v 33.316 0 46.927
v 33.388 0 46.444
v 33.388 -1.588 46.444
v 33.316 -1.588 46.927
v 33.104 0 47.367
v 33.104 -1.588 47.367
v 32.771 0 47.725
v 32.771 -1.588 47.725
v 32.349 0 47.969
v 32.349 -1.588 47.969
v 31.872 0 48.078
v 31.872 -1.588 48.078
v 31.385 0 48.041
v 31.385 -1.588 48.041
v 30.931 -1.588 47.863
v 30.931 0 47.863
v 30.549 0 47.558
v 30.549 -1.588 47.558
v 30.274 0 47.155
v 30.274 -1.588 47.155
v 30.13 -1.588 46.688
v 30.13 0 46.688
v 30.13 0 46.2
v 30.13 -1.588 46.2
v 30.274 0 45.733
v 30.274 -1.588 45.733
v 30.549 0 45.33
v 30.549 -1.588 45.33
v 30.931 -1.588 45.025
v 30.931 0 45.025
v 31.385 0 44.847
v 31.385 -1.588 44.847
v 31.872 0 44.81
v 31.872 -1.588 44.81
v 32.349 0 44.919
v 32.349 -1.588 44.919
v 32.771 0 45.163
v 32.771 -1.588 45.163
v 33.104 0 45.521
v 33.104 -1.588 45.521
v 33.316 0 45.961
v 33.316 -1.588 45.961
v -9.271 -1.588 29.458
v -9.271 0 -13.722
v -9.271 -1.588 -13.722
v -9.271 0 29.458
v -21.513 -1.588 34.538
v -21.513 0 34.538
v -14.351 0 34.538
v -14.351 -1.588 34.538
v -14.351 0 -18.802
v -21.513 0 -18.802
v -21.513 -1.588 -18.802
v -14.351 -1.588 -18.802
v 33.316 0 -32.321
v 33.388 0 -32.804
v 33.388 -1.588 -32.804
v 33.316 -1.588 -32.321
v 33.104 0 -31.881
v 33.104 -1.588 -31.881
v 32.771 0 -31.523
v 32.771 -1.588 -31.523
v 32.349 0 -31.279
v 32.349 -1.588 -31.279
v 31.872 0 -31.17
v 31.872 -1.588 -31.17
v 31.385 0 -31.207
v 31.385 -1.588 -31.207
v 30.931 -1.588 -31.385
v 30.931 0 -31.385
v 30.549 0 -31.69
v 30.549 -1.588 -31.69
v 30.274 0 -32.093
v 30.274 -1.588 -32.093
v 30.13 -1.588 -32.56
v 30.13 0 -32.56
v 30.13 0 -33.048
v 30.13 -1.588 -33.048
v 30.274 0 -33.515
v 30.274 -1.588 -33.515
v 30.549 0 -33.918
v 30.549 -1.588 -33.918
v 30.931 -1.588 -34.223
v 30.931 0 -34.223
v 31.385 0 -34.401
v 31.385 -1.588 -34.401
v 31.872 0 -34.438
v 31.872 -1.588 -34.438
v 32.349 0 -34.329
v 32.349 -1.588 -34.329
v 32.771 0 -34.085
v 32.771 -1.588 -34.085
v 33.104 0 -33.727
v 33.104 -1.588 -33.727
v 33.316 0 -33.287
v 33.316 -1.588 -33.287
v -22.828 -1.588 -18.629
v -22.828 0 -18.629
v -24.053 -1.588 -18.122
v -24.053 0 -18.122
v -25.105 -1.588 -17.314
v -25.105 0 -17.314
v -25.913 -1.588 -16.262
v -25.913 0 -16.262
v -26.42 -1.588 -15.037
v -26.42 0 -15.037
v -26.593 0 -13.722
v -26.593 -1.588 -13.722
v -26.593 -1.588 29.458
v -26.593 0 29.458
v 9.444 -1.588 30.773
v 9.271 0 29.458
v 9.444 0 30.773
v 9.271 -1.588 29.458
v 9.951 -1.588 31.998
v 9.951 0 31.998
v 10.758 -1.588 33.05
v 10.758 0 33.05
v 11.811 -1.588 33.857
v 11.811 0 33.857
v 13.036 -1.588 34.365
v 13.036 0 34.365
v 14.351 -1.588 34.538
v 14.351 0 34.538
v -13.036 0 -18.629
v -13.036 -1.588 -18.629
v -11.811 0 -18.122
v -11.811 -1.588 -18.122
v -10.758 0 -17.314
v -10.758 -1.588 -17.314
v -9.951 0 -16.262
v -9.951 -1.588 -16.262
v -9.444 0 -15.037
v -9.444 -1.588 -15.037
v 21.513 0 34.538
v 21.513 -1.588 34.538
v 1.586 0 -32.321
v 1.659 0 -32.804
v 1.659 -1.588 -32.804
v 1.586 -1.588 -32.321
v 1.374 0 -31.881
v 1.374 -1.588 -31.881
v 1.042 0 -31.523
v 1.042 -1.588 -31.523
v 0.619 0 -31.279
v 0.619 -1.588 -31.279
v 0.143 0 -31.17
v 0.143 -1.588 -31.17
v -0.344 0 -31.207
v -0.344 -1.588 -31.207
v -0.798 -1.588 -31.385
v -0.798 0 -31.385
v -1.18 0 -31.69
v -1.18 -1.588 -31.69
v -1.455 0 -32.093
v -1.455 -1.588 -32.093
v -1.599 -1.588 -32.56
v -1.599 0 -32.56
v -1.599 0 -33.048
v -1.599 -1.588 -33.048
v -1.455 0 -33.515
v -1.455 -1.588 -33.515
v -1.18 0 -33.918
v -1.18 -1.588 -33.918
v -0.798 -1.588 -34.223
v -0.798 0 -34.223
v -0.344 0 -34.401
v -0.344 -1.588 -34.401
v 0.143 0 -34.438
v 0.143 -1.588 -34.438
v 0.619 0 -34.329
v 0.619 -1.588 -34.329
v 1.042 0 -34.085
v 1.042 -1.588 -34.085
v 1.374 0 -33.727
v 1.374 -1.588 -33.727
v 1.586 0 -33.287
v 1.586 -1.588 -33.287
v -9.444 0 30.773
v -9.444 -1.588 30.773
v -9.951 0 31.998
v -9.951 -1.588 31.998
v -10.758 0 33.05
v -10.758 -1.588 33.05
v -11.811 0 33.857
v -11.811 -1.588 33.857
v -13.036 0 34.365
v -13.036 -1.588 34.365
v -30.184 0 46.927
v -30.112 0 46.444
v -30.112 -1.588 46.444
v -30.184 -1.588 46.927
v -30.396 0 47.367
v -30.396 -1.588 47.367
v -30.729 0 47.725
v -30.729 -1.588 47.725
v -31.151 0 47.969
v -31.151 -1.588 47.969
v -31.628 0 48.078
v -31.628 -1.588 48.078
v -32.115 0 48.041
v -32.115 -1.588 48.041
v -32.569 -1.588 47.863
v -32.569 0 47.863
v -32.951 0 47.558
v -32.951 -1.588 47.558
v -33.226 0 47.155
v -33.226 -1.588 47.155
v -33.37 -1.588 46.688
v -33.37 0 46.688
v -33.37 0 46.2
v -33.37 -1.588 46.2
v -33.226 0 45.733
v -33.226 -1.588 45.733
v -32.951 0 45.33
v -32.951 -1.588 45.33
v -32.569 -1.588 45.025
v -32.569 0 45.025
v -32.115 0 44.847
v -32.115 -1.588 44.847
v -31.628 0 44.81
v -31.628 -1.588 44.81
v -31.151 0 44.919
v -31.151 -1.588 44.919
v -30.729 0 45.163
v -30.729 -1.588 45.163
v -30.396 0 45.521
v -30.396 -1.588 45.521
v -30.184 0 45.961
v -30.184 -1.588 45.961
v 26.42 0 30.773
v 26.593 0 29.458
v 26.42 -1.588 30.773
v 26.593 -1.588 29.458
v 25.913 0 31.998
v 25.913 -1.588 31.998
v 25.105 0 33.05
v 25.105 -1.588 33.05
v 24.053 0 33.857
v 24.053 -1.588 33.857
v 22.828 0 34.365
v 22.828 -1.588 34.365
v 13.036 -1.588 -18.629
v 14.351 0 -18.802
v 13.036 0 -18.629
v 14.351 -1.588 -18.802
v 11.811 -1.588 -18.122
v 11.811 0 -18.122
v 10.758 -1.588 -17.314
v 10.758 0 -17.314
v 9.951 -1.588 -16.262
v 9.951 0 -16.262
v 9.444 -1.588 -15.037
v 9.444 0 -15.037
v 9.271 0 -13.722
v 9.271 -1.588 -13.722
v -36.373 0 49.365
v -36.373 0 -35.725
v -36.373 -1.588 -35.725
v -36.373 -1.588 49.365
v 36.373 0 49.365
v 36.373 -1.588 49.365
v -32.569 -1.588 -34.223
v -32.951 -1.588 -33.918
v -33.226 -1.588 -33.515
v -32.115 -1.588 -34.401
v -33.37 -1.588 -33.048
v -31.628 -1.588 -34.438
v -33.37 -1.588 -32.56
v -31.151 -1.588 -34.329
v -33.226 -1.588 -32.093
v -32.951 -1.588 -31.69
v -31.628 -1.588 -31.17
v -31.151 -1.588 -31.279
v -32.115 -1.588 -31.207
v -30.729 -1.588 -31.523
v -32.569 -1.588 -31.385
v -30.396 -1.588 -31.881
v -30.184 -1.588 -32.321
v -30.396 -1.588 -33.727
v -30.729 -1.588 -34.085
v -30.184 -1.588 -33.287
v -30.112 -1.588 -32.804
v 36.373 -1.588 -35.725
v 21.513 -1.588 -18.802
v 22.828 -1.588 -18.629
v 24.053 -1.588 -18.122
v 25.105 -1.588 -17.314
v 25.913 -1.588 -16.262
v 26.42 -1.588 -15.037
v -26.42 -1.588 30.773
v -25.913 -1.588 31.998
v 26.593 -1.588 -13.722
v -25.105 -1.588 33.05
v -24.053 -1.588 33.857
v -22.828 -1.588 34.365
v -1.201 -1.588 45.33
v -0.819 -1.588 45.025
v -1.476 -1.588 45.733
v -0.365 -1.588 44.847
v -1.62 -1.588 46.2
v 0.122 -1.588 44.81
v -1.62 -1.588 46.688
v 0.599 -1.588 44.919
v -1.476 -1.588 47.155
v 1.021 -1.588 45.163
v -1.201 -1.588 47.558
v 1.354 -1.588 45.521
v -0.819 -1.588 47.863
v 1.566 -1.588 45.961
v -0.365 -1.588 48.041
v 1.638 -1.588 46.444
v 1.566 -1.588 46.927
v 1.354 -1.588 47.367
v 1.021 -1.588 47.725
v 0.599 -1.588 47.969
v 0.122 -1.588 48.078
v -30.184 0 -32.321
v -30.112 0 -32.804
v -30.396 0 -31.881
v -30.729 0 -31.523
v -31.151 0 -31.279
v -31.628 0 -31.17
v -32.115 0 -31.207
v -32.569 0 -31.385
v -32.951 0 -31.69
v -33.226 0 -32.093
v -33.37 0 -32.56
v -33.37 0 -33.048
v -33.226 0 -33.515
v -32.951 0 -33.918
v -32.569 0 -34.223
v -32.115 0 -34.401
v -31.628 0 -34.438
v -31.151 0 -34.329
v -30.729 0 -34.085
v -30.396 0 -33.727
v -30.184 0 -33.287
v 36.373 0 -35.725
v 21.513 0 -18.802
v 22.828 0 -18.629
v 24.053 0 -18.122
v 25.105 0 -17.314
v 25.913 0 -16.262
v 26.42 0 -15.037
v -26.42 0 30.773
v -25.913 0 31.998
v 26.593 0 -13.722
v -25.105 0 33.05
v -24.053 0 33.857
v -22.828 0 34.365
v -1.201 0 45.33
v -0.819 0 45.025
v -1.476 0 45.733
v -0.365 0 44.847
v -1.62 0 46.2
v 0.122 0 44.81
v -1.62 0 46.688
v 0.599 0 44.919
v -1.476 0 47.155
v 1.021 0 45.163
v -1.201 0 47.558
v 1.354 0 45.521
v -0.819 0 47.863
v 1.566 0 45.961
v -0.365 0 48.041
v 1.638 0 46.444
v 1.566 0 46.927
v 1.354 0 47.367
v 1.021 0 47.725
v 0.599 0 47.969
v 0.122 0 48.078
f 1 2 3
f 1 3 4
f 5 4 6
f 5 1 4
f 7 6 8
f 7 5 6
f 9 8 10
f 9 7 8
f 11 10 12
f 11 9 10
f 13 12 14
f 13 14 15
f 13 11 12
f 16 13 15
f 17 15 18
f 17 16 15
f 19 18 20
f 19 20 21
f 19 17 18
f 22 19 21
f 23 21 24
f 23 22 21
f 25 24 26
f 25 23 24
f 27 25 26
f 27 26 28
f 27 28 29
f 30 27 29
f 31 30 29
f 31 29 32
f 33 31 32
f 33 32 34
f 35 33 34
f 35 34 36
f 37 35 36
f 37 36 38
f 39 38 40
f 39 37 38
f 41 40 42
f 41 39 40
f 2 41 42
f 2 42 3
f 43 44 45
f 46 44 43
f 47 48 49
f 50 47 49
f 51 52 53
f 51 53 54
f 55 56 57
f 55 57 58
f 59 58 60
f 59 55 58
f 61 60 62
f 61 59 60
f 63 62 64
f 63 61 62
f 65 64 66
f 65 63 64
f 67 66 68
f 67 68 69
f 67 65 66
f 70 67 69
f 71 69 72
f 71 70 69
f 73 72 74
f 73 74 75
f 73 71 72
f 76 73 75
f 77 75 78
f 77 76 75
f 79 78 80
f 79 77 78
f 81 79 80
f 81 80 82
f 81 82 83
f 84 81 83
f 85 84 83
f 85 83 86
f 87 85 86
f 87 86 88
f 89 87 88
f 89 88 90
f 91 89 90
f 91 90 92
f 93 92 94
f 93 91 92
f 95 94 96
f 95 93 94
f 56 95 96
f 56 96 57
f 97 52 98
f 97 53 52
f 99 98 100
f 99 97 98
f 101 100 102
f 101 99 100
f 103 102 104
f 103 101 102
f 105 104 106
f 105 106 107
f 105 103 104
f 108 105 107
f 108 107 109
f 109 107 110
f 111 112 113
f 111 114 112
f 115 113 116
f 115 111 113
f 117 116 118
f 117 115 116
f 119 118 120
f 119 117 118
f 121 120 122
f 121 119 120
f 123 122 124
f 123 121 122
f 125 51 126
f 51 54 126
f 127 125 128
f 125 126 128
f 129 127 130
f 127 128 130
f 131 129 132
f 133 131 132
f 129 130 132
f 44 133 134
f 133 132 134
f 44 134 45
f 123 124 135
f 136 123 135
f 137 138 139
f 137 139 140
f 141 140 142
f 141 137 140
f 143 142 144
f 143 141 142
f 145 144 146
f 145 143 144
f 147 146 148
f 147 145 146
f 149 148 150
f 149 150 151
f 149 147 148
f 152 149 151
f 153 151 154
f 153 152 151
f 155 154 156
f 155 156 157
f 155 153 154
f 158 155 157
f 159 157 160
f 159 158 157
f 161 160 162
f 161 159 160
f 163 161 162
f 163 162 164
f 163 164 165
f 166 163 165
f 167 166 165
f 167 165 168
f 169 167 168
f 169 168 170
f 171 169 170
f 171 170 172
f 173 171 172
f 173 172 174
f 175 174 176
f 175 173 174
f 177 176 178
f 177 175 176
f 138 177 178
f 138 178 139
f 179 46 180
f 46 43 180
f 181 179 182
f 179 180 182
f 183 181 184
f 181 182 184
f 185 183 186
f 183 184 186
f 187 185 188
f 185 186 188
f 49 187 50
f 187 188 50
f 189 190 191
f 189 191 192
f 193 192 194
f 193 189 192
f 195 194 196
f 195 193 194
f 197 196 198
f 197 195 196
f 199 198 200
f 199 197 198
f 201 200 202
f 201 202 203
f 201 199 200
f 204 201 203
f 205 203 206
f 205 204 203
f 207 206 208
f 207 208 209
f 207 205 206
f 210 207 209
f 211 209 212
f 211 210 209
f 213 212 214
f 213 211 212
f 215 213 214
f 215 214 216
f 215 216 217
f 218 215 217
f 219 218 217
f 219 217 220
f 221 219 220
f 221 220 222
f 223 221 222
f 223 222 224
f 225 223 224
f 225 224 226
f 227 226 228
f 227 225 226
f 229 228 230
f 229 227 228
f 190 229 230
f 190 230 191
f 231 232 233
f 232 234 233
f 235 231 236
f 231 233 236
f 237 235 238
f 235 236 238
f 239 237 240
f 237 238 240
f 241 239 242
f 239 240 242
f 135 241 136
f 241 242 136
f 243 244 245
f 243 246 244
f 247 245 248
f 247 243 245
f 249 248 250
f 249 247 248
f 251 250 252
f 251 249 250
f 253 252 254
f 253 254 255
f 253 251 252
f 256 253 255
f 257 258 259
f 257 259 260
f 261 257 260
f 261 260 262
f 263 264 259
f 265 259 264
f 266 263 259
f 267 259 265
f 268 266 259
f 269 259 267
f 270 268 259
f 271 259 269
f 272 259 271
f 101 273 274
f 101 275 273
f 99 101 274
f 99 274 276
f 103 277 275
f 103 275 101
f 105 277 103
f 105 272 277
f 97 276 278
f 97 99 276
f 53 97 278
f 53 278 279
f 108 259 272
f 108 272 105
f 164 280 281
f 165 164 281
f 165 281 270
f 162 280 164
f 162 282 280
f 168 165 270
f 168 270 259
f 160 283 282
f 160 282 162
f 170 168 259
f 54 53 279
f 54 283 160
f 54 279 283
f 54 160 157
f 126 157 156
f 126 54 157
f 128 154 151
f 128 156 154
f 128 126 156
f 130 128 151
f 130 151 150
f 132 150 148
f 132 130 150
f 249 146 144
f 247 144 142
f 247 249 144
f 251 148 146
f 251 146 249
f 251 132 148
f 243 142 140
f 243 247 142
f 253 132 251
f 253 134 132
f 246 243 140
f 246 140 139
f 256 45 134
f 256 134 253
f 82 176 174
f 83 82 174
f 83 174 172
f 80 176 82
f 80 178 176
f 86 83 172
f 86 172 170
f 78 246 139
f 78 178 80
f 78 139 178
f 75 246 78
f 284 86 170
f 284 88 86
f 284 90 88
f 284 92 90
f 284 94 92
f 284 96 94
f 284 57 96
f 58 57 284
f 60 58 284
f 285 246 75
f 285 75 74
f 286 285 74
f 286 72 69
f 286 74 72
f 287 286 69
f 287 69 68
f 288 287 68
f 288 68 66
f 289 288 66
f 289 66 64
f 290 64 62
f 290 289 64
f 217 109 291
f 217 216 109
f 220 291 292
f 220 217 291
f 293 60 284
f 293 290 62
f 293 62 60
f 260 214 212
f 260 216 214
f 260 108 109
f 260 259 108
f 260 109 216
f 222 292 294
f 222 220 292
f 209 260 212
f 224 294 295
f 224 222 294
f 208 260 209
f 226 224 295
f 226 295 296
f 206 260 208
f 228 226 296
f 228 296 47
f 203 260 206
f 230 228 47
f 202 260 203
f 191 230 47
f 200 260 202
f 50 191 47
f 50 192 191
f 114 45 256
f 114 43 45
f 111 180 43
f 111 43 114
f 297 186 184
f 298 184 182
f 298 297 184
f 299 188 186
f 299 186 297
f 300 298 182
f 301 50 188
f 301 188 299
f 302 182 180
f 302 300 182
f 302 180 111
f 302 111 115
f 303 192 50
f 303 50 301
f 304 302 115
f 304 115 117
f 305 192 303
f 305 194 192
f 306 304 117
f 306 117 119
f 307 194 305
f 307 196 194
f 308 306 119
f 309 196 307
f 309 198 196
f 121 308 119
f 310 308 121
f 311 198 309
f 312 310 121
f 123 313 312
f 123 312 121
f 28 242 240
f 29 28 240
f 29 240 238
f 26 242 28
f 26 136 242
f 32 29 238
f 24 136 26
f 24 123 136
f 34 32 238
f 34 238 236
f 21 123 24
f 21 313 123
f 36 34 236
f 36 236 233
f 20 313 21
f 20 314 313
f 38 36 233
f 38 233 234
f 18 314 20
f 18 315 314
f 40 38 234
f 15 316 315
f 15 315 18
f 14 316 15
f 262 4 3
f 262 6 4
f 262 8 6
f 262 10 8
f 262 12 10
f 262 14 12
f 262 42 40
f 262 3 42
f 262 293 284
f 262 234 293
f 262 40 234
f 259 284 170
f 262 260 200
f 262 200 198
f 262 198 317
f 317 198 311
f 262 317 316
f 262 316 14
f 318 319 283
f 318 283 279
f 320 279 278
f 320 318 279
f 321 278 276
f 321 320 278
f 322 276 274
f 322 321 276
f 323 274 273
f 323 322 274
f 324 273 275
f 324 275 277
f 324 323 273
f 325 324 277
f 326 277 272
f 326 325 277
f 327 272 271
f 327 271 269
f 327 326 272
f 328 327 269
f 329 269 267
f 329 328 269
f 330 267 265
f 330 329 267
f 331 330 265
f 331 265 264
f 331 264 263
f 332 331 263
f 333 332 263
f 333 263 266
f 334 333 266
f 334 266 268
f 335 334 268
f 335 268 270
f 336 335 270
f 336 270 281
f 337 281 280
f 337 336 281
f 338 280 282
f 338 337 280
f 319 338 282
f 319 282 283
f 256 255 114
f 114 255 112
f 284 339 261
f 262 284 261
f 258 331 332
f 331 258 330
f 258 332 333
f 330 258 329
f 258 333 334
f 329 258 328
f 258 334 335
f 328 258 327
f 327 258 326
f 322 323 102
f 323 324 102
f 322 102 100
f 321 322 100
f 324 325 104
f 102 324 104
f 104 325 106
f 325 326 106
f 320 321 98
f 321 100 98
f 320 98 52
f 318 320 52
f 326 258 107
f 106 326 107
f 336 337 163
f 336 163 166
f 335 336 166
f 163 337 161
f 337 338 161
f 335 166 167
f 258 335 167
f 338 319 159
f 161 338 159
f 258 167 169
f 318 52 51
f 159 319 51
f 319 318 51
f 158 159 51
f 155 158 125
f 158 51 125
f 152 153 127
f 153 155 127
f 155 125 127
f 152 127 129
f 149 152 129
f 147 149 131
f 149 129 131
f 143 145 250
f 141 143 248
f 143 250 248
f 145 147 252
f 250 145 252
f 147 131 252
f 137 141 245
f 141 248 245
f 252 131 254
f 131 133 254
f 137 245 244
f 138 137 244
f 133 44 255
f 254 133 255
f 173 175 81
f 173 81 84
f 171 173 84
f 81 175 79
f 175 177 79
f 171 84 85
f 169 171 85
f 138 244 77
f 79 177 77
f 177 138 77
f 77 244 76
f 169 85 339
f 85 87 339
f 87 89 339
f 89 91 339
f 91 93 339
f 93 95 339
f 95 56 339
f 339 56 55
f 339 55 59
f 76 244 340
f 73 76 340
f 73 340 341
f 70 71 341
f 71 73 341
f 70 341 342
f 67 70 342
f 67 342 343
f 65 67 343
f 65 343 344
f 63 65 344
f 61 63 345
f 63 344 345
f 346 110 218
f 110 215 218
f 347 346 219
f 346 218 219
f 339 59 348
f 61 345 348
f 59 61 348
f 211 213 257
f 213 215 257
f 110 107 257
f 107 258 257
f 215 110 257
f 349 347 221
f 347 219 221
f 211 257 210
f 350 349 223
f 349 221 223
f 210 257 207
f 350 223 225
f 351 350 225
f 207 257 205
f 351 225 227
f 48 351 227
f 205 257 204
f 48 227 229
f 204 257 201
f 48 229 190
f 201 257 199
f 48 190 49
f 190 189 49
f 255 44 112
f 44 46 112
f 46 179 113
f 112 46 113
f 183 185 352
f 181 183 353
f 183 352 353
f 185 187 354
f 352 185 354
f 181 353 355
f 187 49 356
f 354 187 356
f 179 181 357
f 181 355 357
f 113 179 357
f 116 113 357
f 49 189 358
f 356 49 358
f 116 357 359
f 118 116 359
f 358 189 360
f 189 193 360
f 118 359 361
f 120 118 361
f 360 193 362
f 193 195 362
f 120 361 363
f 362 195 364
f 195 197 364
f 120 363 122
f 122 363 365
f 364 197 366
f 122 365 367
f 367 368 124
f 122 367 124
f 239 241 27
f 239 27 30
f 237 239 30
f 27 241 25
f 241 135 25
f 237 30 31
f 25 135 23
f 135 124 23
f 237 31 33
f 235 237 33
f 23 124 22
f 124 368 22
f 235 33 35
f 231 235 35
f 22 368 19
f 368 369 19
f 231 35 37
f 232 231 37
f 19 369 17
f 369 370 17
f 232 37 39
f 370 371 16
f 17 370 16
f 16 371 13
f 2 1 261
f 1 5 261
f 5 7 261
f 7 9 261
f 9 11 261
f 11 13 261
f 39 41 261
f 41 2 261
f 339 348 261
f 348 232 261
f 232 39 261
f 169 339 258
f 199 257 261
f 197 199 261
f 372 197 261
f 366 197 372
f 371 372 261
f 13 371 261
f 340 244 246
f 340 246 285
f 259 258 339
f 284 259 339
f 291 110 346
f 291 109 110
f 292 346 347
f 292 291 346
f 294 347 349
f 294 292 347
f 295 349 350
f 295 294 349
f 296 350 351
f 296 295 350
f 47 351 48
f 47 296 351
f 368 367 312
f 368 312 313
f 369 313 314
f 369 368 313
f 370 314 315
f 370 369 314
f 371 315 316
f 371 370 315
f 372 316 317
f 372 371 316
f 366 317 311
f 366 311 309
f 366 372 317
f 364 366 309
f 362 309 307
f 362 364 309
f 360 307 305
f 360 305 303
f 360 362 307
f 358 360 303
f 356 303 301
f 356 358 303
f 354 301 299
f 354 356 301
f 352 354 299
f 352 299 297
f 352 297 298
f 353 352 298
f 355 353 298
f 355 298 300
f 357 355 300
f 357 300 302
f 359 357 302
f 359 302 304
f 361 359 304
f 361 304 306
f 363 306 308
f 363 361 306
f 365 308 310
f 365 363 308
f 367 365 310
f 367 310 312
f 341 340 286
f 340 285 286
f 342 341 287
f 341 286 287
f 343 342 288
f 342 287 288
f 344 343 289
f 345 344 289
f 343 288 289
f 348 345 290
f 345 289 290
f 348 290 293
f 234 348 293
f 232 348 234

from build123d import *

# Parameters (mm, degrees)
F0_W     = 72.7456
F0_H     = 85.09
F0_R     = 1.6383
F0_W_2   = 17.3228
F0_H_2   = 53.34
F1_DEPTH = 1.5875
F2_R     = 5.08


with BuildPart() as f1:
    # F0 (on Front) → F1 (new body)
    with BuildSketch(Plane.XZ):
        with Locations((0, 6.819942)):
            Rectangle(F0_W, F0_H)
        with Locations((-31.75, -32.804058)):
            Circle(F0_R, mode=Mode.SUBTRACT)
        with Locations((0.020847, -32.804058)):
            Circle(F0_R, mode=Mode.SUBTRACT)
        with Locations((31.75, -32.804058)):
            Circle(F0_R, mode=Mode.SUBTRACT)
        with Locations((-17.931937, 7.867827)):
            Rectangle(F0_W_2, F0_H_2, mode=Mode.SUBTRACT)
        with Locations((-31.75, 46.443942)):
            Circle(F0_R, mode=Mode.SUBTRACT)
        with Locations((0, 46.443942)):
            Circle(F0_R, mode=Mode.SUBTRACT)
        with Locations((17.931937, 7.867827)):
            Rectangle(F0_W_2, F0_H_2, mode=Mode.SUBTRACT)
        with Locations((31.75, 46.443942)):
            Circle(F0_R, mode=Mode.SUBTRACT)
    extrude(amount=F1_DEPTH)

    # F2
    f2_edges = [f1.edges().sort_by_distance(p)[0] for p in [
        (-26.593337, -0.79375, 34.537827),
        (-9.270537, -0.79375, 34.537827),
        (26.593337, -0.79375, -18.802173),
        (9.270537, -0.79375, -18.802173),
        (9.270537, -0.79375, 34.537827),
        (26.593337, -0.79375, 34.537827),
        (-9.270537, -0.79375, -18.802173),
        (-26.593337, -0.79375, -18.802173),
    ]]
    fillet(f2_edges, radius=F2_R)


solid = f1.part
